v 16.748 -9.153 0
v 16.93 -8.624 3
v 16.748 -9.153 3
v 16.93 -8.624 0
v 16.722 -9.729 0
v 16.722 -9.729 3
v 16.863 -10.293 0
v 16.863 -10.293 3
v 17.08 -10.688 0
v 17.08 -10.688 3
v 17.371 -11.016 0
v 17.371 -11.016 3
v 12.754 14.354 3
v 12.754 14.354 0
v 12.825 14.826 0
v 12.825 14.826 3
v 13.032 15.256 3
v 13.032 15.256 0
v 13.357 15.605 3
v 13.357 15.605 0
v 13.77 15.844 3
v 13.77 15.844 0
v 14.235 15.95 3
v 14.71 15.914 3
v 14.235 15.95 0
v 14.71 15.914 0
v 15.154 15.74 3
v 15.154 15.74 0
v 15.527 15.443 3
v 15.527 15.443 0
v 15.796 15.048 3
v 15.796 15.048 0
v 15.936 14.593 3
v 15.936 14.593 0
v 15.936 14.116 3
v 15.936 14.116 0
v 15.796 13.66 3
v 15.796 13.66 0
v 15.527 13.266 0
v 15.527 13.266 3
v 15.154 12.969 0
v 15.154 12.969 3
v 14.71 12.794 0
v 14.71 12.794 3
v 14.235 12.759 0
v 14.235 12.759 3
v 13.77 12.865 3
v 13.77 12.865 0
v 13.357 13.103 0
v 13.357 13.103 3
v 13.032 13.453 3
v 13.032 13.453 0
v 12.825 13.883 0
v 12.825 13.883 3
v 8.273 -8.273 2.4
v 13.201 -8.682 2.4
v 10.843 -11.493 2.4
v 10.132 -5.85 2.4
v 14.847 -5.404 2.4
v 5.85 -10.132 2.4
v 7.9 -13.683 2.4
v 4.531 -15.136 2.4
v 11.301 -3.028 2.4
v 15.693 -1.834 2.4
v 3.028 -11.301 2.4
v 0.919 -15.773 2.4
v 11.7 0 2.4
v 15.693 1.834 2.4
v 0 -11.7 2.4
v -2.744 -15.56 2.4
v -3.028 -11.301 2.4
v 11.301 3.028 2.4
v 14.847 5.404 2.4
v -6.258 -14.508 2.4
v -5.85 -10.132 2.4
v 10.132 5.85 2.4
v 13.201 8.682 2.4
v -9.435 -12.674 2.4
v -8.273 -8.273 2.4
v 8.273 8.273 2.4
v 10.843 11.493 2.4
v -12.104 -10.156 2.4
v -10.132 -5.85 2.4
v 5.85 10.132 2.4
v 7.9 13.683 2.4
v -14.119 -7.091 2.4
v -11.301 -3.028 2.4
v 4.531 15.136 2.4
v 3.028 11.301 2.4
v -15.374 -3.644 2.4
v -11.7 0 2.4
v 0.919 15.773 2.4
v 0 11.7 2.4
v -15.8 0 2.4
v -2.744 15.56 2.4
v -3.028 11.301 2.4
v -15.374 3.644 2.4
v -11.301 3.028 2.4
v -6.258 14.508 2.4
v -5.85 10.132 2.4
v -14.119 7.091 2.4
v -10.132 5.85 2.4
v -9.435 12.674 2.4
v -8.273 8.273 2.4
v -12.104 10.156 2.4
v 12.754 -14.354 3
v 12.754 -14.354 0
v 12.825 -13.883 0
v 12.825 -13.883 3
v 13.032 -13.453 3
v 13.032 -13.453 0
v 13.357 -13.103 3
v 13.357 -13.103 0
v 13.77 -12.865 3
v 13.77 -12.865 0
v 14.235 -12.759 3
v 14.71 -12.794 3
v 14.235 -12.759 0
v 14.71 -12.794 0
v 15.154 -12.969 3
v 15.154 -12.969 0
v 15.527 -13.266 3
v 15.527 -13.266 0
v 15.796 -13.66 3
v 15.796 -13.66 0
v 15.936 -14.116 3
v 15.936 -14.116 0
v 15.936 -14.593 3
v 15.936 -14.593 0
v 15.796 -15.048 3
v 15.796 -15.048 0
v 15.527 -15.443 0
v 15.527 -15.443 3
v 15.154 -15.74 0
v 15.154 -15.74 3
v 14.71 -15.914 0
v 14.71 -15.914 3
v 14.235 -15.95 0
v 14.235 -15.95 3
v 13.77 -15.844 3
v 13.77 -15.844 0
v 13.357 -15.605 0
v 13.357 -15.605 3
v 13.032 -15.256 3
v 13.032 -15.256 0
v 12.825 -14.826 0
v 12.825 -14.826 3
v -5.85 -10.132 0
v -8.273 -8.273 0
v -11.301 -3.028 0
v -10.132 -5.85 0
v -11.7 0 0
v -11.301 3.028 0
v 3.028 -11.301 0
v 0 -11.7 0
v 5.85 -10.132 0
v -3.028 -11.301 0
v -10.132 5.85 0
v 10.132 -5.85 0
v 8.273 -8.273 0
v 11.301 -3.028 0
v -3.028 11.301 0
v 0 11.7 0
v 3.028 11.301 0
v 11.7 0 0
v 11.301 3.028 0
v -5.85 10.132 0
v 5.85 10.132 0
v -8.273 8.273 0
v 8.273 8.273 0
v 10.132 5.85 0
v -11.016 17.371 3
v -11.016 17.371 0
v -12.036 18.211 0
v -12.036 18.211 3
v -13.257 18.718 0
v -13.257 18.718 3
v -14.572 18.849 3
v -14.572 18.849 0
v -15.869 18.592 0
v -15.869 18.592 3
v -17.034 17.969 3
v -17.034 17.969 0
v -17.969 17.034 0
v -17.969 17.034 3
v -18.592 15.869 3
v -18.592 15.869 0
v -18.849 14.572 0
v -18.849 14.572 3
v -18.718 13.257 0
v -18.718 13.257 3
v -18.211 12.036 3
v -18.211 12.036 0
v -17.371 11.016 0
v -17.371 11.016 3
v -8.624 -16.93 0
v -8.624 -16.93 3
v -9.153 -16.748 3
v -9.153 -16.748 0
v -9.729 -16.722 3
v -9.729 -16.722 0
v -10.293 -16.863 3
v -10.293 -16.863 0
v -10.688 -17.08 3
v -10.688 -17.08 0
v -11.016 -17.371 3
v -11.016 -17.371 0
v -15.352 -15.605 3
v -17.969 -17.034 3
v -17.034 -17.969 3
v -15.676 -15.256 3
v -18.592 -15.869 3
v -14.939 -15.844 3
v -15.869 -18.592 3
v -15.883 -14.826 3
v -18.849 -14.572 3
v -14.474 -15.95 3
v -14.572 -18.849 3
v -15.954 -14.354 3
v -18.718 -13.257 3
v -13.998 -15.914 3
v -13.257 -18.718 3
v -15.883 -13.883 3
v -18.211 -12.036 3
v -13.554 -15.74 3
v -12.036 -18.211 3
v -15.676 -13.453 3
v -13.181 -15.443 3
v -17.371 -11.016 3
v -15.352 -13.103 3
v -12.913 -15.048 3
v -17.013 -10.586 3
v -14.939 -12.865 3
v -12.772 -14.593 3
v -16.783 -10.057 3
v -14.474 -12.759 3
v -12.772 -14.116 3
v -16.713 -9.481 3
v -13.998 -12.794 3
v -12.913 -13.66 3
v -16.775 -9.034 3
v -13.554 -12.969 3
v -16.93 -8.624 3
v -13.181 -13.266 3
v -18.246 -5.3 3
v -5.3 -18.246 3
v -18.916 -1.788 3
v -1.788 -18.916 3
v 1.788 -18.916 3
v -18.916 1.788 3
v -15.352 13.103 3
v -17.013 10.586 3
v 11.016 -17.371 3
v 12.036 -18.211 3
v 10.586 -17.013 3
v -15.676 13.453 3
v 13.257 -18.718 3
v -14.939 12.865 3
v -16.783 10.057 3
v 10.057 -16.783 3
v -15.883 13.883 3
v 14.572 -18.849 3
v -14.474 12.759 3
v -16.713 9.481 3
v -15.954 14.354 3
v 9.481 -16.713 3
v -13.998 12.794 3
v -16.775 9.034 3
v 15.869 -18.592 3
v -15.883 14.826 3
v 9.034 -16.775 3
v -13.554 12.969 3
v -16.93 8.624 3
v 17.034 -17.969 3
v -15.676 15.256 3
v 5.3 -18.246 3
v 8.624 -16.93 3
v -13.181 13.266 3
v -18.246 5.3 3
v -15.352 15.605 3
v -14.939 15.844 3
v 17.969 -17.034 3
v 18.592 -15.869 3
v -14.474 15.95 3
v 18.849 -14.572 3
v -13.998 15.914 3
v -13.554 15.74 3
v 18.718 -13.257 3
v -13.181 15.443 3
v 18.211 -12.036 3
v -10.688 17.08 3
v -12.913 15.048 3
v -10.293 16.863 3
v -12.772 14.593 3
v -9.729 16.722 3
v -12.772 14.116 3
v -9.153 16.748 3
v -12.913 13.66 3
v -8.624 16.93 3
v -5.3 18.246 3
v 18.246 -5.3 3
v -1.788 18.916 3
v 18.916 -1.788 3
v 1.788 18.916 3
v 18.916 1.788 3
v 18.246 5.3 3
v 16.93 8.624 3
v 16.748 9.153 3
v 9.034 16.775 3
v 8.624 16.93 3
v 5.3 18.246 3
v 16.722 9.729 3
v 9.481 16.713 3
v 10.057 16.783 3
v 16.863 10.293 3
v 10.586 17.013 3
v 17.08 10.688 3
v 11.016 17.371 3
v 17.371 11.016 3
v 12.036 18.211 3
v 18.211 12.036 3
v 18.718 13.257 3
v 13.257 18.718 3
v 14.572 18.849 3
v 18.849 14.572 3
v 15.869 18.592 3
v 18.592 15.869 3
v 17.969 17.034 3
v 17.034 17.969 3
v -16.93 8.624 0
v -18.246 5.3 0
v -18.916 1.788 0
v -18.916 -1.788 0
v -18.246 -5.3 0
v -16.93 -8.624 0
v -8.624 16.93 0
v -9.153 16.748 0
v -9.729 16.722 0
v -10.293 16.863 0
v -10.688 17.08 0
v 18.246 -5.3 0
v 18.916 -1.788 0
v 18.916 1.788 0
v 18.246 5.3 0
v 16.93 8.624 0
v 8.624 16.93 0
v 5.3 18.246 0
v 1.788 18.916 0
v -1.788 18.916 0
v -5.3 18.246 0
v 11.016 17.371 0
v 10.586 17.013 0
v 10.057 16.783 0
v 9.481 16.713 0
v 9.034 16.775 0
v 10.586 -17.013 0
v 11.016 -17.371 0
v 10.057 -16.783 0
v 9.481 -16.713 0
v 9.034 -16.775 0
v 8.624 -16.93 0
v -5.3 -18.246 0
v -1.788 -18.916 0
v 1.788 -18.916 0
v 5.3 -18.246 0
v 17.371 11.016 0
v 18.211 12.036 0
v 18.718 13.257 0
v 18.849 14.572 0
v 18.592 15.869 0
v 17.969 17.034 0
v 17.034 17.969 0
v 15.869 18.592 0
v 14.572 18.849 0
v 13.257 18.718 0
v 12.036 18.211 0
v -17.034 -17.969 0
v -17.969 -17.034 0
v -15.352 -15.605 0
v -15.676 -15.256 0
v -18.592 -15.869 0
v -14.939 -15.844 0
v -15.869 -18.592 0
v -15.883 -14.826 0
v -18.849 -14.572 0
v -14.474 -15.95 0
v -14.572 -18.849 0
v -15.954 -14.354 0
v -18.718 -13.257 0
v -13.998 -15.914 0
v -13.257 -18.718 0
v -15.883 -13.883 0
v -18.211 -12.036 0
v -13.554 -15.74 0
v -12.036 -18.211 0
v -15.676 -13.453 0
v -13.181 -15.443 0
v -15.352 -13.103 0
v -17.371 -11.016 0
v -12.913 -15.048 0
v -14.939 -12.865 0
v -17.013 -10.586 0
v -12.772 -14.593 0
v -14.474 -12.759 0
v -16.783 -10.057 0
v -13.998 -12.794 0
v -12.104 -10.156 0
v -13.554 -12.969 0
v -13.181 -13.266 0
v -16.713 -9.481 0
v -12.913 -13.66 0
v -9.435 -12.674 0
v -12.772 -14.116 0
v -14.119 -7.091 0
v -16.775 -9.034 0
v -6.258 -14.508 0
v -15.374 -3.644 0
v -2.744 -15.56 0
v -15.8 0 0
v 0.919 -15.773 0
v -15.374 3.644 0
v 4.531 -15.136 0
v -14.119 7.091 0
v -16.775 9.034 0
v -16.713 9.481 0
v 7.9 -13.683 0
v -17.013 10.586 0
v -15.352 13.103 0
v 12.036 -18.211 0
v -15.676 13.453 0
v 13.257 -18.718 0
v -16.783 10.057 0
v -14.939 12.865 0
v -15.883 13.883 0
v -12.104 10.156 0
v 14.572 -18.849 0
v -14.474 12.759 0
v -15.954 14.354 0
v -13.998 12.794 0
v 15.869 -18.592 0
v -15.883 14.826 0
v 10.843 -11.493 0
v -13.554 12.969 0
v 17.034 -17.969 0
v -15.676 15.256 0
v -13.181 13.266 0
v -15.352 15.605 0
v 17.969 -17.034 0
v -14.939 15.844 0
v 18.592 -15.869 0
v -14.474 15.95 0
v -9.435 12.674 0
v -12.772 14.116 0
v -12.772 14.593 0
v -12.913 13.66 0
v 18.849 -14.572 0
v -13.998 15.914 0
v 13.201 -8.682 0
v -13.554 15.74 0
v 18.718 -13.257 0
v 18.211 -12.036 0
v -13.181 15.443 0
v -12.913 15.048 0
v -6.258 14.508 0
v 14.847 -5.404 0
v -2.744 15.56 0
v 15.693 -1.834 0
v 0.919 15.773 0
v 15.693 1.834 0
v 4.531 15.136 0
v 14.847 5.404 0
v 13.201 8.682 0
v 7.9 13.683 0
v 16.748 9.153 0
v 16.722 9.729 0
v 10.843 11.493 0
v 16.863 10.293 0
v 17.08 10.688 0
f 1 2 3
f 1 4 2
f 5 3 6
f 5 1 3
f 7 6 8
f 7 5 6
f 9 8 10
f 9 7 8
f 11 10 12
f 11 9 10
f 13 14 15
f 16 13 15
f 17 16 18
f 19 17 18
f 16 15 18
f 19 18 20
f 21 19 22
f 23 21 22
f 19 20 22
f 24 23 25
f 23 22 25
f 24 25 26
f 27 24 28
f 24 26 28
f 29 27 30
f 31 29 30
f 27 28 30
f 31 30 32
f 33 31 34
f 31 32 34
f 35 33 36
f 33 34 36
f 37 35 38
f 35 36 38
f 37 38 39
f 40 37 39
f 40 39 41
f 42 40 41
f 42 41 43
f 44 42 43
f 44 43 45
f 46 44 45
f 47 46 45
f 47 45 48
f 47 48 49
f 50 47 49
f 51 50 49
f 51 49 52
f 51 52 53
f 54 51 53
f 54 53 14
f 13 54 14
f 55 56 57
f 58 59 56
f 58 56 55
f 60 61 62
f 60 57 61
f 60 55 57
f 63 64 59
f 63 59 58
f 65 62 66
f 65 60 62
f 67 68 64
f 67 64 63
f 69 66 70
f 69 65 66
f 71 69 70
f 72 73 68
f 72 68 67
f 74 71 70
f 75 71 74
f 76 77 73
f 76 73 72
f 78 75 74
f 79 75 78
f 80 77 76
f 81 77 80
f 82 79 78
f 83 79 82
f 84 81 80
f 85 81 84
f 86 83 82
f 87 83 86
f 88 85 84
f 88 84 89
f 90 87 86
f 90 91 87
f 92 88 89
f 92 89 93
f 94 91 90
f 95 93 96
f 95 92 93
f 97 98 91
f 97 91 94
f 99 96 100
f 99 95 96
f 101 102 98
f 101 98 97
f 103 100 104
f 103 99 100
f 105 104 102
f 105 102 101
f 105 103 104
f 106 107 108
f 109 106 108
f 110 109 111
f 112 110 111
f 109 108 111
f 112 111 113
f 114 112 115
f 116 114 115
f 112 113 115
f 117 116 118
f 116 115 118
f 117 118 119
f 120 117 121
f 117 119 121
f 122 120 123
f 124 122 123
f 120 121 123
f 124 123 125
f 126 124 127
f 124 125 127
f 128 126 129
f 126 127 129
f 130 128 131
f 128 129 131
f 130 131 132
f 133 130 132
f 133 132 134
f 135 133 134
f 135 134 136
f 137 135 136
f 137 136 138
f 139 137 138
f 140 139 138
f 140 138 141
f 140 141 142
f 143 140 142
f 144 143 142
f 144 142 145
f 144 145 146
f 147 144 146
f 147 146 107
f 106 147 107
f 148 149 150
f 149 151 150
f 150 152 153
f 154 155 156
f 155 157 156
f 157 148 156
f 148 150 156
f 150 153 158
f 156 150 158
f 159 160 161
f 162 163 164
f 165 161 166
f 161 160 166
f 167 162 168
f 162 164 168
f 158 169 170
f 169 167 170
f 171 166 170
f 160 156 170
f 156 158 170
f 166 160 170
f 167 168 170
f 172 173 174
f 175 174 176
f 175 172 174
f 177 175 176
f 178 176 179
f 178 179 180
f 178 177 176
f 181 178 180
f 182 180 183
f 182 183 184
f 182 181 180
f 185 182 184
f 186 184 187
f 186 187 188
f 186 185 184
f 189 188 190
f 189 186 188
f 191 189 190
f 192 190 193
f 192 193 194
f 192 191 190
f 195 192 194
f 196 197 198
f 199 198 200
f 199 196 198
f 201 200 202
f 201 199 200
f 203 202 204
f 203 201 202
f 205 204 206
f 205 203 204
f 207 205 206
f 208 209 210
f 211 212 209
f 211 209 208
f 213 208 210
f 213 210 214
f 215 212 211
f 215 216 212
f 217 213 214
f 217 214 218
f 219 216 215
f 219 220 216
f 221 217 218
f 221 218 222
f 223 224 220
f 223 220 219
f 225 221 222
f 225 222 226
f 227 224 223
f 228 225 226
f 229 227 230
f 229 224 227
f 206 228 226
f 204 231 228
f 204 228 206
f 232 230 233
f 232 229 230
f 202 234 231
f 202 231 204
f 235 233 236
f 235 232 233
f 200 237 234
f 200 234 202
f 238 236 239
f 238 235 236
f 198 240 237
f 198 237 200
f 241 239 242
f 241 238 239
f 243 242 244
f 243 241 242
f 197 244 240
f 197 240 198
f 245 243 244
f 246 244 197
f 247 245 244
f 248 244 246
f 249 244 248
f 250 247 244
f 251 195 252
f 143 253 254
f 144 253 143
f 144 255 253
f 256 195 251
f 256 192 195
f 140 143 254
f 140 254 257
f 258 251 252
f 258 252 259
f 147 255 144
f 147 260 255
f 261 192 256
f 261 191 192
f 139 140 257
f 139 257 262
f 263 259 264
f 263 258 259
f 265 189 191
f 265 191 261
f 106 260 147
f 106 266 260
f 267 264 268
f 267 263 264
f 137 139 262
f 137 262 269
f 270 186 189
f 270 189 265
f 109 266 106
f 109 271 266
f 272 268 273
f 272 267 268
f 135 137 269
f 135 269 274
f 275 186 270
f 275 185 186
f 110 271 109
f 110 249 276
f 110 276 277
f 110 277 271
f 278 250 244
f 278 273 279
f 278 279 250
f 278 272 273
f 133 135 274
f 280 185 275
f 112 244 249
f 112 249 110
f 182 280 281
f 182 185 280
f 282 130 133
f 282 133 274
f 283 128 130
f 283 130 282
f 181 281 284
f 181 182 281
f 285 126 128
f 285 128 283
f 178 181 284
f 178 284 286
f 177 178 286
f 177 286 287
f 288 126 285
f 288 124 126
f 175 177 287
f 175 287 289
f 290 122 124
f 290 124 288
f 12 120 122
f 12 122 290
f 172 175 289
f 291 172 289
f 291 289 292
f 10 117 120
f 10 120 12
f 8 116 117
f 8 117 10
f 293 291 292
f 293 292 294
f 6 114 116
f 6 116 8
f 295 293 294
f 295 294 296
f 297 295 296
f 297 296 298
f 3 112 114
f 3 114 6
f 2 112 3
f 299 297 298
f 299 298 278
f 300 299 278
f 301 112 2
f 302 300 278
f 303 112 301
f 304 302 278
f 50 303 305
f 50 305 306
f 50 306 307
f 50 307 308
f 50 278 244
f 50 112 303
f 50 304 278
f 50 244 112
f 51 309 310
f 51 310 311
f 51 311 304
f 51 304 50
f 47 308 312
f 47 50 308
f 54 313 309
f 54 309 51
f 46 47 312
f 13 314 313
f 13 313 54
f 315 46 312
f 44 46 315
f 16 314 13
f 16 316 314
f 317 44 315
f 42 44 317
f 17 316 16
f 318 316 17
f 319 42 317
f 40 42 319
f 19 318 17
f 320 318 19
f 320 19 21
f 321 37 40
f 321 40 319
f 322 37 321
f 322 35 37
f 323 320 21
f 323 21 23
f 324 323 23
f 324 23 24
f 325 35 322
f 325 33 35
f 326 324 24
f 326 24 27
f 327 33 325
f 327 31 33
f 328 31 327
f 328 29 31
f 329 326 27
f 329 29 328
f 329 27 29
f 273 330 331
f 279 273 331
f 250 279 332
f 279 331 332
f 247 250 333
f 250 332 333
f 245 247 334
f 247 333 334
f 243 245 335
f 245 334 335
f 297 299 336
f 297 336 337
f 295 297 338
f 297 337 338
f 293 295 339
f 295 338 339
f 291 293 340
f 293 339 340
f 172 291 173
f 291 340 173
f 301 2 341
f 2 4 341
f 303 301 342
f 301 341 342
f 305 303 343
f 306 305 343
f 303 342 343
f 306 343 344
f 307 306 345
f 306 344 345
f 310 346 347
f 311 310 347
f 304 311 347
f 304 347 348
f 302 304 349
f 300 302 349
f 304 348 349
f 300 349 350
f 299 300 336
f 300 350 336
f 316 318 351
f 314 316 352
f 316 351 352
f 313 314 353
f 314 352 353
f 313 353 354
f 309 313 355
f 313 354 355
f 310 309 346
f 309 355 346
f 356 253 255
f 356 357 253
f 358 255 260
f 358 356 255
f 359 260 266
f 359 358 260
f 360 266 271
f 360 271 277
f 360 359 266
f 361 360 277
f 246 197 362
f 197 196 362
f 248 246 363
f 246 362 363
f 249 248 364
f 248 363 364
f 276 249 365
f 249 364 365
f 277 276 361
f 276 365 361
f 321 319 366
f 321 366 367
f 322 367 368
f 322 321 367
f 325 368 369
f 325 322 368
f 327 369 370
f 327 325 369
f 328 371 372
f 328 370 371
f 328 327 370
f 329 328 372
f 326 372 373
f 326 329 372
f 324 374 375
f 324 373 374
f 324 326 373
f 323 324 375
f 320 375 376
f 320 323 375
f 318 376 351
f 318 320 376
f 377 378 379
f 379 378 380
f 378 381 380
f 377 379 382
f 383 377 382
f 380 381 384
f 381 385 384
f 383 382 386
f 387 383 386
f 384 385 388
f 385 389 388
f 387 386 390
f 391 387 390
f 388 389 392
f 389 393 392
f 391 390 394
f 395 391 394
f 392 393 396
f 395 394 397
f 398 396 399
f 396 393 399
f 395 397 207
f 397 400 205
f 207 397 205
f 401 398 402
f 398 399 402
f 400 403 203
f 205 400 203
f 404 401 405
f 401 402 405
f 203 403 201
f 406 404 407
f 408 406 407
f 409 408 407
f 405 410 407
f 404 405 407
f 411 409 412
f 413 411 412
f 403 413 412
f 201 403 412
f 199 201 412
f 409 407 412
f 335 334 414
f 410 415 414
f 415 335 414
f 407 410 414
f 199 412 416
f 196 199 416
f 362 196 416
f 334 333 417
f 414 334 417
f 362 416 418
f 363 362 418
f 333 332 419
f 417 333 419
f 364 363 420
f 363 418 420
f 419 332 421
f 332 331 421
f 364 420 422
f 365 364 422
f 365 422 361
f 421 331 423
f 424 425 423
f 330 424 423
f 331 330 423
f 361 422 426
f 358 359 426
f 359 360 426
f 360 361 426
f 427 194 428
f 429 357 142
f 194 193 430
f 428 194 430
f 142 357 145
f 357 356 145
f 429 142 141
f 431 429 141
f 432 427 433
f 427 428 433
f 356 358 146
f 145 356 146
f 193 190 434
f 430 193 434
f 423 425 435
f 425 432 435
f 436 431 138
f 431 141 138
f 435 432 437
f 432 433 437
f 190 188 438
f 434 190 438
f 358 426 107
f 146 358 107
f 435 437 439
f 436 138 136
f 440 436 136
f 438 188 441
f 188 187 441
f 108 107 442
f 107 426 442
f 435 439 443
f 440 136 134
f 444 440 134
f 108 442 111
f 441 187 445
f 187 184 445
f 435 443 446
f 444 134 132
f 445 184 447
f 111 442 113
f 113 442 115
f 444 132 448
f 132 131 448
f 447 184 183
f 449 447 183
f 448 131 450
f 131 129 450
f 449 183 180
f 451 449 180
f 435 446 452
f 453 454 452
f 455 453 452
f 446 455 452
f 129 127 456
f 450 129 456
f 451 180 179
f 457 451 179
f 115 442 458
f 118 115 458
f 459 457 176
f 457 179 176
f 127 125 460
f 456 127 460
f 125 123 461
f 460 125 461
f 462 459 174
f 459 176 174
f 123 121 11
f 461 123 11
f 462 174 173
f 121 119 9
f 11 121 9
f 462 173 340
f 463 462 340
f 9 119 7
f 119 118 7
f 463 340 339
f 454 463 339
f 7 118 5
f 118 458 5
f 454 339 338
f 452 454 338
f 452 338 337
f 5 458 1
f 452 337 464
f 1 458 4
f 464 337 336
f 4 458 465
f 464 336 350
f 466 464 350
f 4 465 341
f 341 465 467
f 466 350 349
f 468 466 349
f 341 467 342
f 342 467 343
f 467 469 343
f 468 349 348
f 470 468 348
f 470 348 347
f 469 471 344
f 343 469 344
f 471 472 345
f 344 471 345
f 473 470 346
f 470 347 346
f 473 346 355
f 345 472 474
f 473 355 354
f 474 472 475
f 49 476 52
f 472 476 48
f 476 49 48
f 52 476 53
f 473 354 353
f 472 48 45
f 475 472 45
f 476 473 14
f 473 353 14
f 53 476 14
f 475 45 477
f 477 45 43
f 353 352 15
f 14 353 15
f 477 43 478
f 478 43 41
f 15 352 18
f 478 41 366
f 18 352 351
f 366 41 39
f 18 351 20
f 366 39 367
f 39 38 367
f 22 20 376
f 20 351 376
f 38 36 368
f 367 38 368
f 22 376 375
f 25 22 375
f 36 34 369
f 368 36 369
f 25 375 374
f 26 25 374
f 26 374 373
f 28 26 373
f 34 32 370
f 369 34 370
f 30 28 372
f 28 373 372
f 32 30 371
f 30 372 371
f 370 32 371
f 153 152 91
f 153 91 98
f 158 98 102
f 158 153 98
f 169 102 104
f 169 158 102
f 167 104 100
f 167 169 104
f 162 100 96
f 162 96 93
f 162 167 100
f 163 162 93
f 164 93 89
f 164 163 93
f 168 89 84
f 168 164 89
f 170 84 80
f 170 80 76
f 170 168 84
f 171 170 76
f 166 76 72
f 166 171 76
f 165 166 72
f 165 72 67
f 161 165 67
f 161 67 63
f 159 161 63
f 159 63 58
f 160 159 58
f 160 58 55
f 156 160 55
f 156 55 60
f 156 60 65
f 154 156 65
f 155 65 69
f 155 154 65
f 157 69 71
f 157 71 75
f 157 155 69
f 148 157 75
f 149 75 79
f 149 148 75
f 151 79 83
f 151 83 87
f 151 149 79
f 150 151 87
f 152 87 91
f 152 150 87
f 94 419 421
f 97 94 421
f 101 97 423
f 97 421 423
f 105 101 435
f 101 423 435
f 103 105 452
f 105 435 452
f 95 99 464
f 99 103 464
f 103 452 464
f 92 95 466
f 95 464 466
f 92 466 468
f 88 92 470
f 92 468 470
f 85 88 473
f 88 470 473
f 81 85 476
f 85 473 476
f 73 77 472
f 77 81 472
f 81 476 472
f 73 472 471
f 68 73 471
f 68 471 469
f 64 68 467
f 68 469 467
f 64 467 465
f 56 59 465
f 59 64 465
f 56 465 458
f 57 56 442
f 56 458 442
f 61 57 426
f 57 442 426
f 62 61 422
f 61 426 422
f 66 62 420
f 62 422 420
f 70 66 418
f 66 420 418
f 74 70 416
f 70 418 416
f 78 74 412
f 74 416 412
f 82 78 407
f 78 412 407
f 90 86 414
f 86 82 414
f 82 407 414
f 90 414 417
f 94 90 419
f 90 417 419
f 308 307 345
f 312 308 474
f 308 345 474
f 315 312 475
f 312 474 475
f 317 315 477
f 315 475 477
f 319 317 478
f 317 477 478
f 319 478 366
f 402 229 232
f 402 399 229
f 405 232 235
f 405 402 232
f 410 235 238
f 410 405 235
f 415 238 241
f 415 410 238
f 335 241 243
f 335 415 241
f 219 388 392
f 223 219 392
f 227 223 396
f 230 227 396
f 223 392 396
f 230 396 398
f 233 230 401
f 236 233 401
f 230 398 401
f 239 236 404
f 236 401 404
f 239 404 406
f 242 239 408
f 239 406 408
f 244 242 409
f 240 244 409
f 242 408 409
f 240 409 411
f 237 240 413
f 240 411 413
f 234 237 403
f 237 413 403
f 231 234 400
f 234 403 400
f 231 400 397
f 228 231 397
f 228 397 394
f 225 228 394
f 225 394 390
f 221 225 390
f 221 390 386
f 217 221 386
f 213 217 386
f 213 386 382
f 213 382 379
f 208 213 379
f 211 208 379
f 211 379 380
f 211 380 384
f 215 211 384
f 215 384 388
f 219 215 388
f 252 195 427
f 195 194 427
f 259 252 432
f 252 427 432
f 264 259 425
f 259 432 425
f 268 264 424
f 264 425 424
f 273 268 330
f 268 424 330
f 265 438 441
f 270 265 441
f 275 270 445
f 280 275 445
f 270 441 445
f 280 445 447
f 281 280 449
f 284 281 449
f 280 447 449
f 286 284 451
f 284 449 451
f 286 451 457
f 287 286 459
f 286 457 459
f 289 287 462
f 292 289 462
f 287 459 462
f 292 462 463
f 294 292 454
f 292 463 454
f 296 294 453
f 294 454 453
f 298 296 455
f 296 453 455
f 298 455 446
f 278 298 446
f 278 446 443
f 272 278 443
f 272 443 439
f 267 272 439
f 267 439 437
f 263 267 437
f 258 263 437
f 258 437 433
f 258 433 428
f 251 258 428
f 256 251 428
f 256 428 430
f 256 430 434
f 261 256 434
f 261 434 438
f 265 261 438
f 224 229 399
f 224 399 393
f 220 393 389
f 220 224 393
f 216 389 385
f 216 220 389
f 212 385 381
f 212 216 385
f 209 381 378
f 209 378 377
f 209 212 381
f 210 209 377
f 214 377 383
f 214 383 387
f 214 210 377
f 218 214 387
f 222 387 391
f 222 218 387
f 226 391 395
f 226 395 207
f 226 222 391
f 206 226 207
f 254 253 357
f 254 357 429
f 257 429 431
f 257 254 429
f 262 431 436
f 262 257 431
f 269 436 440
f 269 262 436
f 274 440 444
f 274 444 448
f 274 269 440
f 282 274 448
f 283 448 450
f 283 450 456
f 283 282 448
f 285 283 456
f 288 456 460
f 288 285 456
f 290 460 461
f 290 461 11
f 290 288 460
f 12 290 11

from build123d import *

# Parameters (mm, degrees)
SKETCH_1_R          = 19
EXTRUDE_1_DEPTH     = 3
SKETCH_2_R          = 15.8
SKETCH_2_R_2        = 11.7
CUT_EXTRUDE_1_DEPTH = 2.4
SKETCH_3_R          = 4.5
EXTRUDE_2_DEPTH     = 3
HOLE_WIZARD_M3_1_D  = 3.2
FILLET_1_R          = 2


with BuildPart() as part:
    # ｽｹｯﾁ1 → ﾎﾞｽ - 押し出し1 (new body)
    with BuildSketch(Plane.XY):
        Circle(SKETCH_1_R)
    extrude(amount=EXTRUDE_1_DEPTH)

    # ｽｹｯﾁ2 → ｶｯﾄ - 押し出し1 (cut)
    with BuildSketch(Plane(origin=(0, 0, 0), x_dir=(-1, 0, 0), z_dir=(0, 0, -1))):
        Circle(SKETCH_2_R)
        Circle(SKETCH_2_R_2, mode=Mode.SUBTRACT)
    extrude(amount=-CUT_EXTRUDE_1_DEPTH, mode=Mode.SUBTRACT)

    # ｽｹｯﾁ3 → ﾎﾞｽ - 押し出し2 (add)
    with BuildSketch(Plane.XY.offset(3)):
        with Locations((-14.354267658, 14.354267658)):
            Circle(SKETCH_3_R)
        with Locations((14.354267658, 14.354267658)):
            Circle(SKETCH_3_R)
        with Locations((14.354267658, -14.354267658)):
            Circle(SKETCH_3_R)
        with Locations((-14.354267658, -14.354267658)):
            Circle(SKETCH_3_R)
    extrude(amount=-EXTRUDE_2_DEPTH)

    # M3 すきま穴1 (through all)
    with Locations(Plane.XY.offset(3)):
        with Locations((-14.354267658, 14.354267658), (-14.354267658, -14.354267658), (14.354267658, 14.354267658), (14.354267658, -14.354267658)):
            Hole(HOLE_WIZARD_M3_1_D / 2)

    # ﾌｨﾚｯﾄ1
    fillet_1_edges = [part.edges().sort_by_distance(p)[0] for p in [
        (-10.182407316, 16.041152741, 1.5),
        (-16.041152741, 10.182407316, 1.5),
        (16.041152741, 10.182407316, 1.5),
        (10.182407316, 16.041152741, 1.5),
        (10.182407316, -16.041152741, 1.5),
        (16.041152741, -10.182407316, 1.5),
        (-16.041152741, -10.182407316, 1.5),
        (-10.182407316, -16.041152741, 1.5),
    ]]
    fillet(fillet_1_edges, radius=FILLET_1_R)


solid = part.part
